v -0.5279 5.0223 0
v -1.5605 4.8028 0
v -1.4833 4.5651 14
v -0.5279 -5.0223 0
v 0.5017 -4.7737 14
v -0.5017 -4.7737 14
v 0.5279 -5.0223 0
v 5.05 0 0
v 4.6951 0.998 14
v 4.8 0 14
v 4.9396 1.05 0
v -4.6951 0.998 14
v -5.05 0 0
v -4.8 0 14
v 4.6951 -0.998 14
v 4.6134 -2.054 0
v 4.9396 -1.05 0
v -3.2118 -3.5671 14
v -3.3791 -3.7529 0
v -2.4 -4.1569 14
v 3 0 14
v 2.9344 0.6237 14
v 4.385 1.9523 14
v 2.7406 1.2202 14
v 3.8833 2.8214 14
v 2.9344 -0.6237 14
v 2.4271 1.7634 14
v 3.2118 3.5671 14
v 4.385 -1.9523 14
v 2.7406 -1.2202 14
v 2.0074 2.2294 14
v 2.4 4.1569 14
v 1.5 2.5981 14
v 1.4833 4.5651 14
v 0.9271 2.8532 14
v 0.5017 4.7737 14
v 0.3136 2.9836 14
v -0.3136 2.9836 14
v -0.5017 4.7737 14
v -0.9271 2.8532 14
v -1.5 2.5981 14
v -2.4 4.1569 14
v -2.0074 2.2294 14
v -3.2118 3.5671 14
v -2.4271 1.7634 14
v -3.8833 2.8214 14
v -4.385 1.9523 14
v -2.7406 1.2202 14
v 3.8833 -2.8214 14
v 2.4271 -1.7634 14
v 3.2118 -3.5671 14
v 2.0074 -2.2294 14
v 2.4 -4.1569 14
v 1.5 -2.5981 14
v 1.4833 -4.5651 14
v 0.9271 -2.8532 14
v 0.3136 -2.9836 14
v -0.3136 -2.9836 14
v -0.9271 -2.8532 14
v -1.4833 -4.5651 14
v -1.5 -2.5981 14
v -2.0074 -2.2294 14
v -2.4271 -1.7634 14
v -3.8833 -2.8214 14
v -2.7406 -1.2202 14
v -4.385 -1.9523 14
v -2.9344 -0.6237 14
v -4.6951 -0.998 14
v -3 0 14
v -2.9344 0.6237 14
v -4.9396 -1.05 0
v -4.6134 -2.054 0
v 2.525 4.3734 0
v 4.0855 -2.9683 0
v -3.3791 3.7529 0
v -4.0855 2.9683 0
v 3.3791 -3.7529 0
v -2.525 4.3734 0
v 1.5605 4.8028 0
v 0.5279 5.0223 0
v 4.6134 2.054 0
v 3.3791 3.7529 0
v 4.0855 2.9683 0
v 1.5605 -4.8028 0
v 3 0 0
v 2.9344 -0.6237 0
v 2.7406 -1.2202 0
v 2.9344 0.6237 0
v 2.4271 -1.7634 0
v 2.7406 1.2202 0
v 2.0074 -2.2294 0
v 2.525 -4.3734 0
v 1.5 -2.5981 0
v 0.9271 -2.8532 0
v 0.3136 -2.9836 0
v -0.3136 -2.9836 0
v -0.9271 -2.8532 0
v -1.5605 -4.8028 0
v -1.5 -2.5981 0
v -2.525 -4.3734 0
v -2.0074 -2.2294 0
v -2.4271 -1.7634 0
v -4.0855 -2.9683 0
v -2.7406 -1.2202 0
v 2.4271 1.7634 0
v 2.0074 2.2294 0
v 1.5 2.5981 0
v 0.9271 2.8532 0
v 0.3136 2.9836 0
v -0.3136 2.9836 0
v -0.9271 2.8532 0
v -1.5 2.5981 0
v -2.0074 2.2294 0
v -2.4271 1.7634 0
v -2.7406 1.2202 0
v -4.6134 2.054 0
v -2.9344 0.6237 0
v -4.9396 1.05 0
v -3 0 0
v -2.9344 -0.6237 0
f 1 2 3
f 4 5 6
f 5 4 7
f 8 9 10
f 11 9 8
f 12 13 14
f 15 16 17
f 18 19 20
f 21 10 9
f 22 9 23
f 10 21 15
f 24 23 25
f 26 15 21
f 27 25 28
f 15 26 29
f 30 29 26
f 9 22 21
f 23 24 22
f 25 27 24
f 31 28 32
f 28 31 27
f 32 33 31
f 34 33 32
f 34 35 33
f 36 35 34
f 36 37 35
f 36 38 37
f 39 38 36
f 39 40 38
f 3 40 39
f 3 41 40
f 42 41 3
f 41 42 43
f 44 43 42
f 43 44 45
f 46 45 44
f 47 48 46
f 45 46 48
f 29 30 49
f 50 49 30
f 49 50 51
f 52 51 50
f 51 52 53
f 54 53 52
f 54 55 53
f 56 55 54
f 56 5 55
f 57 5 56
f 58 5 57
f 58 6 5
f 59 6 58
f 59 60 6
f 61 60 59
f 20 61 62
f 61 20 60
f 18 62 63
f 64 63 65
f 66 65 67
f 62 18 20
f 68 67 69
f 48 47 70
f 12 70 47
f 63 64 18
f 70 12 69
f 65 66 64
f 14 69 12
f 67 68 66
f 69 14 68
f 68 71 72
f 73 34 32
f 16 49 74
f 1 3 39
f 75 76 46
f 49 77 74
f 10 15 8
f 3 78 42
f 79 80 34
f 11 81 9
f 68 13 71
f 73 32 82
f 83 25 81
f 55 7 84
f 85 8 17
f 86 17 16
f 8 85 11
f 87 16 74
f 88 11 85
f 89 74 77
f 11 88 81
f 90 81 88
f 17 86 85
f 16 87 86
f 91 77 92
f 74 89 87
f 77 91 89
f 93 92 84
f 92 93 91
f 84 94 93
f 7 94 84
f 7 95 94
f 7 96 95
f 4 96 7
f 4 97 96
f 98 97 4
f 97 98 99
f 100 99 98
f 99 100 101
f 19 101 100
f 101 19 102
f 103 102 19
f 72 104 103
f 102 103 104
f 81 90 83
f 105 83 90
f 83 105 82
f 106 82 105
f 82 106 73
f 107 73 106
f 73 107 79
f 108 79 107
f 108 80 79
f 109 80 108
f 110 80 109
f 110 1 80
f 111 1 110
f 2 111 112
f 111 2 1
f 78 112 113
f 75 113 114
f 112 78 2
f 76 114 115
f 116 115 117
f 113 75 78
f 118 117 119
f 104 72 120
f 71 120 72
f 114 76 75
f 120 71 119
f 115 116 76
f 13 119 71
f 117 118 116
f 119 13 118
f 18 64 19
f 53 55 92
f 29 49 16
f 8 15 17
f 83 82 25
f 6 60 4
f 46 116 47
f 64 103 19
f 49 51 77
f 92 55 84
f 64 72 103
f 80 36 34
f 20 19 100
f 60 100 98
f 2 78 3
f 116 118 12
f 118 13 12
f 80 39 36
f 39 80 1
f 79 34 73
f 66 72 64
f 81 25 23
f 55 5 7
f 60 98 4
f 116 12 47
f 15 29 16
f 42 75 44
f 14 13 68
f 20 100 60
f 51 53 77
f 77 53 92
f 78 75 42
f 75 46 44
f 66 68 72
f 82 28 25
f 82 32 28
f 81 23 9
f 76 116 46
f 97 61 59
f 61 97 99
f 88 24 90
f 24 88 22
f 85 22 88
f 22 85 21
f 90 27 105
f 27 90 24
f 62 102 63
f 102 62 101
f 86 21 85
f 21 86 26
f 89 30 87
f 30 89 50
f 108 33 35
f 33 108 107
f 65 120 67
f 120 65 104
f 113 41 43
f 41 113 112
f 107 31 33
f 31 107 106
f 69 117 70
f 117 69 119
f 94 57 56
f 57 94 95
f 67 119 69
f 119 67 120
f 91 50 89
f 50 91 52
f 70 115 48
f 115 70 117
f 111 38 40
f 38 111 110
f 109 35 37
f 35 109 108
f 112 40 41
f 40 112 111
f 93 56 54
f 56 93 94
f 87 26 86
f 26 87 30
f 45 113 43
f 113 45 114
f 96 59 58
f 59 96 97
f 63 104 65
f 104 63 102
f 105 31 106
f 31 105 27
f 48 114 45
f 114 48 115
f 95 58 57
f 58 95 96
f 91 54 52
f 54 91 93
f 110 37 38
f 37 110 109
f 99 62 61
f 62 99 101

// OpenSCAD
// file: bolt_boss_male.scad
// Create a boss for retaining a bolt.
module bolt_boss_male(bolt_diameter = 3,
                      height = 14,
                      existing_case_thickness = 3,
                      // Wall thickness for bosses should be 0.6 to minimise sinking, but can be increased in non-visible
                      // areas for extra strength.
                      boss_wall_thickness_factor = 0.6,
                      // Is this boss intended for a self-tapping screw? (Hole will be reduced 70% if true).
                      self_tapping = false) {
   epsilon = 0.01;

   if(height >= (5 * existing_case_thickness)) {
      echo("Warning: Bolt boss height should not exceed 5 x existing case thickness.");
   }

   // Allow for self-tapping if required
   bolt_hole_diameter = (self_tapping == true) ? 0.7 * bolt_diameter : bolt_diameter;

   outer_radius = bolt_hole_diameter + (existing_case_thickness * boss_wall_thickness_factor);
   difference() {
      // Outer
      cylinder(h = height, r1 = outer_radius + 0.25, r2 = outer_radius);
      // Inner
      translate([0,0,-(epsilon/2)])
      cylinder(h = height + epsilon, r = bolt_hole_diameter);
   }
}

// Test code
$fs = 0.15;
bolt_boss_male();
// main file
// Re-exports for this module collection.
// Users need only 'use <lib.scad>' to bring all supported modules into scope.

include <bolt_boss_male.scad>;
